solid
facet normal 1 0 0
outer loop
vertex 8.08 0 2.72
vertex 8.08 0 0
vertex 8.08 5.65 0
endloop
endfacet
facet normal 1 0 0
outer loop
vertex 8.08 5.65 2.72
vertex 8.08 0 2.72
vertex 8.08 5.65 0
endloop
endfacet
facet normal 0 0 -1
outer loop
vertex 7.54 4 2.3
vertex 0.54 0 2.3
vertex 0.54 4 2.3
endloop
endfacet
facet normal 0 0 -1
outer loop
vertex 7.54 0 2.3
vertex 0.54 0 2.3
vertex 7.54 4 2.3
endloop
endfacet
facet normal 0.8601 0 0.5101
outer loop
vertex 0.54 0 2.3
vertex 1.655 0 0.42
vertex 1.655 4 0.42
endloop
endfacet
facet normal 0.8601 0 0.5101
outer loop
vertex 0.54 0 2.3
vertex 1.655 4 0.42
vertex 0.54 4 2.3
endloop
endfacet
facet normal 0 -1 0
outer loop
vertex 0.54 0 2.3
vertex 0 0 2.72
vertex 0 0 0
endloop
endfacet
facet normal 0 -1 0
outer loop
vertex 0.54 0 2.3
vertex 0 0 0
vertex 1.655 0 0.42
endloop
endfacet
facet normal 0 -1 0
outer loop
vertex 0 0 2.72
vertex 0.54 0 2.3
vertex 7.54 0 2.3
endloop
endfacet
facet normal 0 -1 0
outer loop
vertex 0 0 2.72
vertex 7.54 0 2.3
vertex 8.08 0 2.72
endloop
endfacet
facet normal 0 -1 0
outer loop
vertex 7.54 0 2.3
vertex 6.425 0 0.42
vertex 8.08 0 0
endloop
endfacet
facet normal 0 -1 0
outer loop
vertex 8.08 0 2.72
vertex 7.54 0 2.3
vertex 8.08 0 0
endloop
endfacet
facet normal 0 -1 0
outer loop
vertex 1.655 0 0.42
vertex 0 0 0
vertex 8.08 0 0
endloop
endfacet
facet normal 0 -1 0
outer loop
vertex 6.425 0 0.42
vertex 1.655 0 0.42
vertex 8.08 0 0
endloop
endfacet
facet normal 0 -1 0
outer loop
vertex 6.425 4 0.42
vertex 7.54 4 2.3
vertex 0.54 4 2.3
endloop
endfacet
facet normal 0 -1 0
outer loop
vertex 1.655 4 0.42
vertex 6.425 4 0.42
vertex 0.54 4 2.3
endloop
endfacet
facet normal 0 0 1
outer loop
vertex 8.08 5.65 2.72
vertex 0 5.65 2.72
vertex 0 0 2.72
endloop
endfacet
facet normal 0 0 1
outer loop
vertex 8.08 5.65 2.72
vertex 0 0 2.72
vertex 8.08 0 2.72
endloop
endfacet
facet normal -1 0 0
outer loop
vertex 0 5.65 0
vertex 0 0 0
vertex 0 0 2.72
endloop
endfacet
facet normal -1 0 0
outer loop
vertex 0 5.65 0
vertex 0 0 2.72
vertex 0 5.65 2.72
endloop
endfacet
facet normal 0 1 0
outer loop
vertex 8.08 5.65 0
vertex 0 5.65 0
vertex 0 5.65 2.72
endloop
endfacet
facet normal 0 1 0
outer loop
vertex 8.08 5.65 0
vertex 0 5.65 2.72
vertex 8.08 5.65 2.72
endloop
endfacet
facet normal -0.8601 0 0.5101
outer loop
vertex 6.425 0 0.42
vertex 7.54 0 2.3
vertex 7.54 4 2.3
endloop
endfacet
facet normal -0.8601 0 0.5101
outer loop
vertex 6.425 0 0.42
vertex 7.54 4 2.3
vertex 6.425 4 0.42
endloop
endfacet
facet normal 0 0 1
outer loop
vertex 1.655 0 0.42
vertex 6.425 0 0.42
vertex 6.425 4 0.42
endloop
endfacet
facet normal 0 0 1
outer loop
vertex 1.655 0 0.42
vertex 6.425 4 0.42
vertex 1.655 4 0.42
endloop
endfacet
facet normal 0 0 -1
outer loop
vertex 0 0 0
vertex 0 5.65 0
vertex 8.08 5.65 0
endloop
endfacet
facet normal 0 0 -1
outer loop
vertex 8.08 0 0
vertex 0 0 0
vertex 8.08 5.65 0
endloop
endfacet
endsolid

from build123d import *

# Parameters (mm, degrees)
SKETCH1_W           = 8.08
SKETCH1_H           = 5.65
BOSS_EXTRUDE1_DEPTH = 2.72
CUT_EXTRUDE1_DEPTH  = 4


with BuildPart() as part:
    # Sketch1 → Boss-Extrude1 (new body)
    with BuildSketch(Plane.XY):
        with Locations((4.04, 2.825)):
            Rectangle(SKETCH1_W, SKETCH1_H)
    extrude(amount=BOSS_EXTRUDE1_DEPTH)

    # Sketch2 → Cut-Extrude1 (cut)
    with BuildSketch(Plane.XZ):
        Polygon((0.54, 2.3), (7.54, 2.3), (6.425, 0.42), (1.655, 0.42), align=None)
    extrude(amount=-CUT_EXTRUDE1_DEPTH, mode=Mode.SUBTRACT)


solid = part.part
